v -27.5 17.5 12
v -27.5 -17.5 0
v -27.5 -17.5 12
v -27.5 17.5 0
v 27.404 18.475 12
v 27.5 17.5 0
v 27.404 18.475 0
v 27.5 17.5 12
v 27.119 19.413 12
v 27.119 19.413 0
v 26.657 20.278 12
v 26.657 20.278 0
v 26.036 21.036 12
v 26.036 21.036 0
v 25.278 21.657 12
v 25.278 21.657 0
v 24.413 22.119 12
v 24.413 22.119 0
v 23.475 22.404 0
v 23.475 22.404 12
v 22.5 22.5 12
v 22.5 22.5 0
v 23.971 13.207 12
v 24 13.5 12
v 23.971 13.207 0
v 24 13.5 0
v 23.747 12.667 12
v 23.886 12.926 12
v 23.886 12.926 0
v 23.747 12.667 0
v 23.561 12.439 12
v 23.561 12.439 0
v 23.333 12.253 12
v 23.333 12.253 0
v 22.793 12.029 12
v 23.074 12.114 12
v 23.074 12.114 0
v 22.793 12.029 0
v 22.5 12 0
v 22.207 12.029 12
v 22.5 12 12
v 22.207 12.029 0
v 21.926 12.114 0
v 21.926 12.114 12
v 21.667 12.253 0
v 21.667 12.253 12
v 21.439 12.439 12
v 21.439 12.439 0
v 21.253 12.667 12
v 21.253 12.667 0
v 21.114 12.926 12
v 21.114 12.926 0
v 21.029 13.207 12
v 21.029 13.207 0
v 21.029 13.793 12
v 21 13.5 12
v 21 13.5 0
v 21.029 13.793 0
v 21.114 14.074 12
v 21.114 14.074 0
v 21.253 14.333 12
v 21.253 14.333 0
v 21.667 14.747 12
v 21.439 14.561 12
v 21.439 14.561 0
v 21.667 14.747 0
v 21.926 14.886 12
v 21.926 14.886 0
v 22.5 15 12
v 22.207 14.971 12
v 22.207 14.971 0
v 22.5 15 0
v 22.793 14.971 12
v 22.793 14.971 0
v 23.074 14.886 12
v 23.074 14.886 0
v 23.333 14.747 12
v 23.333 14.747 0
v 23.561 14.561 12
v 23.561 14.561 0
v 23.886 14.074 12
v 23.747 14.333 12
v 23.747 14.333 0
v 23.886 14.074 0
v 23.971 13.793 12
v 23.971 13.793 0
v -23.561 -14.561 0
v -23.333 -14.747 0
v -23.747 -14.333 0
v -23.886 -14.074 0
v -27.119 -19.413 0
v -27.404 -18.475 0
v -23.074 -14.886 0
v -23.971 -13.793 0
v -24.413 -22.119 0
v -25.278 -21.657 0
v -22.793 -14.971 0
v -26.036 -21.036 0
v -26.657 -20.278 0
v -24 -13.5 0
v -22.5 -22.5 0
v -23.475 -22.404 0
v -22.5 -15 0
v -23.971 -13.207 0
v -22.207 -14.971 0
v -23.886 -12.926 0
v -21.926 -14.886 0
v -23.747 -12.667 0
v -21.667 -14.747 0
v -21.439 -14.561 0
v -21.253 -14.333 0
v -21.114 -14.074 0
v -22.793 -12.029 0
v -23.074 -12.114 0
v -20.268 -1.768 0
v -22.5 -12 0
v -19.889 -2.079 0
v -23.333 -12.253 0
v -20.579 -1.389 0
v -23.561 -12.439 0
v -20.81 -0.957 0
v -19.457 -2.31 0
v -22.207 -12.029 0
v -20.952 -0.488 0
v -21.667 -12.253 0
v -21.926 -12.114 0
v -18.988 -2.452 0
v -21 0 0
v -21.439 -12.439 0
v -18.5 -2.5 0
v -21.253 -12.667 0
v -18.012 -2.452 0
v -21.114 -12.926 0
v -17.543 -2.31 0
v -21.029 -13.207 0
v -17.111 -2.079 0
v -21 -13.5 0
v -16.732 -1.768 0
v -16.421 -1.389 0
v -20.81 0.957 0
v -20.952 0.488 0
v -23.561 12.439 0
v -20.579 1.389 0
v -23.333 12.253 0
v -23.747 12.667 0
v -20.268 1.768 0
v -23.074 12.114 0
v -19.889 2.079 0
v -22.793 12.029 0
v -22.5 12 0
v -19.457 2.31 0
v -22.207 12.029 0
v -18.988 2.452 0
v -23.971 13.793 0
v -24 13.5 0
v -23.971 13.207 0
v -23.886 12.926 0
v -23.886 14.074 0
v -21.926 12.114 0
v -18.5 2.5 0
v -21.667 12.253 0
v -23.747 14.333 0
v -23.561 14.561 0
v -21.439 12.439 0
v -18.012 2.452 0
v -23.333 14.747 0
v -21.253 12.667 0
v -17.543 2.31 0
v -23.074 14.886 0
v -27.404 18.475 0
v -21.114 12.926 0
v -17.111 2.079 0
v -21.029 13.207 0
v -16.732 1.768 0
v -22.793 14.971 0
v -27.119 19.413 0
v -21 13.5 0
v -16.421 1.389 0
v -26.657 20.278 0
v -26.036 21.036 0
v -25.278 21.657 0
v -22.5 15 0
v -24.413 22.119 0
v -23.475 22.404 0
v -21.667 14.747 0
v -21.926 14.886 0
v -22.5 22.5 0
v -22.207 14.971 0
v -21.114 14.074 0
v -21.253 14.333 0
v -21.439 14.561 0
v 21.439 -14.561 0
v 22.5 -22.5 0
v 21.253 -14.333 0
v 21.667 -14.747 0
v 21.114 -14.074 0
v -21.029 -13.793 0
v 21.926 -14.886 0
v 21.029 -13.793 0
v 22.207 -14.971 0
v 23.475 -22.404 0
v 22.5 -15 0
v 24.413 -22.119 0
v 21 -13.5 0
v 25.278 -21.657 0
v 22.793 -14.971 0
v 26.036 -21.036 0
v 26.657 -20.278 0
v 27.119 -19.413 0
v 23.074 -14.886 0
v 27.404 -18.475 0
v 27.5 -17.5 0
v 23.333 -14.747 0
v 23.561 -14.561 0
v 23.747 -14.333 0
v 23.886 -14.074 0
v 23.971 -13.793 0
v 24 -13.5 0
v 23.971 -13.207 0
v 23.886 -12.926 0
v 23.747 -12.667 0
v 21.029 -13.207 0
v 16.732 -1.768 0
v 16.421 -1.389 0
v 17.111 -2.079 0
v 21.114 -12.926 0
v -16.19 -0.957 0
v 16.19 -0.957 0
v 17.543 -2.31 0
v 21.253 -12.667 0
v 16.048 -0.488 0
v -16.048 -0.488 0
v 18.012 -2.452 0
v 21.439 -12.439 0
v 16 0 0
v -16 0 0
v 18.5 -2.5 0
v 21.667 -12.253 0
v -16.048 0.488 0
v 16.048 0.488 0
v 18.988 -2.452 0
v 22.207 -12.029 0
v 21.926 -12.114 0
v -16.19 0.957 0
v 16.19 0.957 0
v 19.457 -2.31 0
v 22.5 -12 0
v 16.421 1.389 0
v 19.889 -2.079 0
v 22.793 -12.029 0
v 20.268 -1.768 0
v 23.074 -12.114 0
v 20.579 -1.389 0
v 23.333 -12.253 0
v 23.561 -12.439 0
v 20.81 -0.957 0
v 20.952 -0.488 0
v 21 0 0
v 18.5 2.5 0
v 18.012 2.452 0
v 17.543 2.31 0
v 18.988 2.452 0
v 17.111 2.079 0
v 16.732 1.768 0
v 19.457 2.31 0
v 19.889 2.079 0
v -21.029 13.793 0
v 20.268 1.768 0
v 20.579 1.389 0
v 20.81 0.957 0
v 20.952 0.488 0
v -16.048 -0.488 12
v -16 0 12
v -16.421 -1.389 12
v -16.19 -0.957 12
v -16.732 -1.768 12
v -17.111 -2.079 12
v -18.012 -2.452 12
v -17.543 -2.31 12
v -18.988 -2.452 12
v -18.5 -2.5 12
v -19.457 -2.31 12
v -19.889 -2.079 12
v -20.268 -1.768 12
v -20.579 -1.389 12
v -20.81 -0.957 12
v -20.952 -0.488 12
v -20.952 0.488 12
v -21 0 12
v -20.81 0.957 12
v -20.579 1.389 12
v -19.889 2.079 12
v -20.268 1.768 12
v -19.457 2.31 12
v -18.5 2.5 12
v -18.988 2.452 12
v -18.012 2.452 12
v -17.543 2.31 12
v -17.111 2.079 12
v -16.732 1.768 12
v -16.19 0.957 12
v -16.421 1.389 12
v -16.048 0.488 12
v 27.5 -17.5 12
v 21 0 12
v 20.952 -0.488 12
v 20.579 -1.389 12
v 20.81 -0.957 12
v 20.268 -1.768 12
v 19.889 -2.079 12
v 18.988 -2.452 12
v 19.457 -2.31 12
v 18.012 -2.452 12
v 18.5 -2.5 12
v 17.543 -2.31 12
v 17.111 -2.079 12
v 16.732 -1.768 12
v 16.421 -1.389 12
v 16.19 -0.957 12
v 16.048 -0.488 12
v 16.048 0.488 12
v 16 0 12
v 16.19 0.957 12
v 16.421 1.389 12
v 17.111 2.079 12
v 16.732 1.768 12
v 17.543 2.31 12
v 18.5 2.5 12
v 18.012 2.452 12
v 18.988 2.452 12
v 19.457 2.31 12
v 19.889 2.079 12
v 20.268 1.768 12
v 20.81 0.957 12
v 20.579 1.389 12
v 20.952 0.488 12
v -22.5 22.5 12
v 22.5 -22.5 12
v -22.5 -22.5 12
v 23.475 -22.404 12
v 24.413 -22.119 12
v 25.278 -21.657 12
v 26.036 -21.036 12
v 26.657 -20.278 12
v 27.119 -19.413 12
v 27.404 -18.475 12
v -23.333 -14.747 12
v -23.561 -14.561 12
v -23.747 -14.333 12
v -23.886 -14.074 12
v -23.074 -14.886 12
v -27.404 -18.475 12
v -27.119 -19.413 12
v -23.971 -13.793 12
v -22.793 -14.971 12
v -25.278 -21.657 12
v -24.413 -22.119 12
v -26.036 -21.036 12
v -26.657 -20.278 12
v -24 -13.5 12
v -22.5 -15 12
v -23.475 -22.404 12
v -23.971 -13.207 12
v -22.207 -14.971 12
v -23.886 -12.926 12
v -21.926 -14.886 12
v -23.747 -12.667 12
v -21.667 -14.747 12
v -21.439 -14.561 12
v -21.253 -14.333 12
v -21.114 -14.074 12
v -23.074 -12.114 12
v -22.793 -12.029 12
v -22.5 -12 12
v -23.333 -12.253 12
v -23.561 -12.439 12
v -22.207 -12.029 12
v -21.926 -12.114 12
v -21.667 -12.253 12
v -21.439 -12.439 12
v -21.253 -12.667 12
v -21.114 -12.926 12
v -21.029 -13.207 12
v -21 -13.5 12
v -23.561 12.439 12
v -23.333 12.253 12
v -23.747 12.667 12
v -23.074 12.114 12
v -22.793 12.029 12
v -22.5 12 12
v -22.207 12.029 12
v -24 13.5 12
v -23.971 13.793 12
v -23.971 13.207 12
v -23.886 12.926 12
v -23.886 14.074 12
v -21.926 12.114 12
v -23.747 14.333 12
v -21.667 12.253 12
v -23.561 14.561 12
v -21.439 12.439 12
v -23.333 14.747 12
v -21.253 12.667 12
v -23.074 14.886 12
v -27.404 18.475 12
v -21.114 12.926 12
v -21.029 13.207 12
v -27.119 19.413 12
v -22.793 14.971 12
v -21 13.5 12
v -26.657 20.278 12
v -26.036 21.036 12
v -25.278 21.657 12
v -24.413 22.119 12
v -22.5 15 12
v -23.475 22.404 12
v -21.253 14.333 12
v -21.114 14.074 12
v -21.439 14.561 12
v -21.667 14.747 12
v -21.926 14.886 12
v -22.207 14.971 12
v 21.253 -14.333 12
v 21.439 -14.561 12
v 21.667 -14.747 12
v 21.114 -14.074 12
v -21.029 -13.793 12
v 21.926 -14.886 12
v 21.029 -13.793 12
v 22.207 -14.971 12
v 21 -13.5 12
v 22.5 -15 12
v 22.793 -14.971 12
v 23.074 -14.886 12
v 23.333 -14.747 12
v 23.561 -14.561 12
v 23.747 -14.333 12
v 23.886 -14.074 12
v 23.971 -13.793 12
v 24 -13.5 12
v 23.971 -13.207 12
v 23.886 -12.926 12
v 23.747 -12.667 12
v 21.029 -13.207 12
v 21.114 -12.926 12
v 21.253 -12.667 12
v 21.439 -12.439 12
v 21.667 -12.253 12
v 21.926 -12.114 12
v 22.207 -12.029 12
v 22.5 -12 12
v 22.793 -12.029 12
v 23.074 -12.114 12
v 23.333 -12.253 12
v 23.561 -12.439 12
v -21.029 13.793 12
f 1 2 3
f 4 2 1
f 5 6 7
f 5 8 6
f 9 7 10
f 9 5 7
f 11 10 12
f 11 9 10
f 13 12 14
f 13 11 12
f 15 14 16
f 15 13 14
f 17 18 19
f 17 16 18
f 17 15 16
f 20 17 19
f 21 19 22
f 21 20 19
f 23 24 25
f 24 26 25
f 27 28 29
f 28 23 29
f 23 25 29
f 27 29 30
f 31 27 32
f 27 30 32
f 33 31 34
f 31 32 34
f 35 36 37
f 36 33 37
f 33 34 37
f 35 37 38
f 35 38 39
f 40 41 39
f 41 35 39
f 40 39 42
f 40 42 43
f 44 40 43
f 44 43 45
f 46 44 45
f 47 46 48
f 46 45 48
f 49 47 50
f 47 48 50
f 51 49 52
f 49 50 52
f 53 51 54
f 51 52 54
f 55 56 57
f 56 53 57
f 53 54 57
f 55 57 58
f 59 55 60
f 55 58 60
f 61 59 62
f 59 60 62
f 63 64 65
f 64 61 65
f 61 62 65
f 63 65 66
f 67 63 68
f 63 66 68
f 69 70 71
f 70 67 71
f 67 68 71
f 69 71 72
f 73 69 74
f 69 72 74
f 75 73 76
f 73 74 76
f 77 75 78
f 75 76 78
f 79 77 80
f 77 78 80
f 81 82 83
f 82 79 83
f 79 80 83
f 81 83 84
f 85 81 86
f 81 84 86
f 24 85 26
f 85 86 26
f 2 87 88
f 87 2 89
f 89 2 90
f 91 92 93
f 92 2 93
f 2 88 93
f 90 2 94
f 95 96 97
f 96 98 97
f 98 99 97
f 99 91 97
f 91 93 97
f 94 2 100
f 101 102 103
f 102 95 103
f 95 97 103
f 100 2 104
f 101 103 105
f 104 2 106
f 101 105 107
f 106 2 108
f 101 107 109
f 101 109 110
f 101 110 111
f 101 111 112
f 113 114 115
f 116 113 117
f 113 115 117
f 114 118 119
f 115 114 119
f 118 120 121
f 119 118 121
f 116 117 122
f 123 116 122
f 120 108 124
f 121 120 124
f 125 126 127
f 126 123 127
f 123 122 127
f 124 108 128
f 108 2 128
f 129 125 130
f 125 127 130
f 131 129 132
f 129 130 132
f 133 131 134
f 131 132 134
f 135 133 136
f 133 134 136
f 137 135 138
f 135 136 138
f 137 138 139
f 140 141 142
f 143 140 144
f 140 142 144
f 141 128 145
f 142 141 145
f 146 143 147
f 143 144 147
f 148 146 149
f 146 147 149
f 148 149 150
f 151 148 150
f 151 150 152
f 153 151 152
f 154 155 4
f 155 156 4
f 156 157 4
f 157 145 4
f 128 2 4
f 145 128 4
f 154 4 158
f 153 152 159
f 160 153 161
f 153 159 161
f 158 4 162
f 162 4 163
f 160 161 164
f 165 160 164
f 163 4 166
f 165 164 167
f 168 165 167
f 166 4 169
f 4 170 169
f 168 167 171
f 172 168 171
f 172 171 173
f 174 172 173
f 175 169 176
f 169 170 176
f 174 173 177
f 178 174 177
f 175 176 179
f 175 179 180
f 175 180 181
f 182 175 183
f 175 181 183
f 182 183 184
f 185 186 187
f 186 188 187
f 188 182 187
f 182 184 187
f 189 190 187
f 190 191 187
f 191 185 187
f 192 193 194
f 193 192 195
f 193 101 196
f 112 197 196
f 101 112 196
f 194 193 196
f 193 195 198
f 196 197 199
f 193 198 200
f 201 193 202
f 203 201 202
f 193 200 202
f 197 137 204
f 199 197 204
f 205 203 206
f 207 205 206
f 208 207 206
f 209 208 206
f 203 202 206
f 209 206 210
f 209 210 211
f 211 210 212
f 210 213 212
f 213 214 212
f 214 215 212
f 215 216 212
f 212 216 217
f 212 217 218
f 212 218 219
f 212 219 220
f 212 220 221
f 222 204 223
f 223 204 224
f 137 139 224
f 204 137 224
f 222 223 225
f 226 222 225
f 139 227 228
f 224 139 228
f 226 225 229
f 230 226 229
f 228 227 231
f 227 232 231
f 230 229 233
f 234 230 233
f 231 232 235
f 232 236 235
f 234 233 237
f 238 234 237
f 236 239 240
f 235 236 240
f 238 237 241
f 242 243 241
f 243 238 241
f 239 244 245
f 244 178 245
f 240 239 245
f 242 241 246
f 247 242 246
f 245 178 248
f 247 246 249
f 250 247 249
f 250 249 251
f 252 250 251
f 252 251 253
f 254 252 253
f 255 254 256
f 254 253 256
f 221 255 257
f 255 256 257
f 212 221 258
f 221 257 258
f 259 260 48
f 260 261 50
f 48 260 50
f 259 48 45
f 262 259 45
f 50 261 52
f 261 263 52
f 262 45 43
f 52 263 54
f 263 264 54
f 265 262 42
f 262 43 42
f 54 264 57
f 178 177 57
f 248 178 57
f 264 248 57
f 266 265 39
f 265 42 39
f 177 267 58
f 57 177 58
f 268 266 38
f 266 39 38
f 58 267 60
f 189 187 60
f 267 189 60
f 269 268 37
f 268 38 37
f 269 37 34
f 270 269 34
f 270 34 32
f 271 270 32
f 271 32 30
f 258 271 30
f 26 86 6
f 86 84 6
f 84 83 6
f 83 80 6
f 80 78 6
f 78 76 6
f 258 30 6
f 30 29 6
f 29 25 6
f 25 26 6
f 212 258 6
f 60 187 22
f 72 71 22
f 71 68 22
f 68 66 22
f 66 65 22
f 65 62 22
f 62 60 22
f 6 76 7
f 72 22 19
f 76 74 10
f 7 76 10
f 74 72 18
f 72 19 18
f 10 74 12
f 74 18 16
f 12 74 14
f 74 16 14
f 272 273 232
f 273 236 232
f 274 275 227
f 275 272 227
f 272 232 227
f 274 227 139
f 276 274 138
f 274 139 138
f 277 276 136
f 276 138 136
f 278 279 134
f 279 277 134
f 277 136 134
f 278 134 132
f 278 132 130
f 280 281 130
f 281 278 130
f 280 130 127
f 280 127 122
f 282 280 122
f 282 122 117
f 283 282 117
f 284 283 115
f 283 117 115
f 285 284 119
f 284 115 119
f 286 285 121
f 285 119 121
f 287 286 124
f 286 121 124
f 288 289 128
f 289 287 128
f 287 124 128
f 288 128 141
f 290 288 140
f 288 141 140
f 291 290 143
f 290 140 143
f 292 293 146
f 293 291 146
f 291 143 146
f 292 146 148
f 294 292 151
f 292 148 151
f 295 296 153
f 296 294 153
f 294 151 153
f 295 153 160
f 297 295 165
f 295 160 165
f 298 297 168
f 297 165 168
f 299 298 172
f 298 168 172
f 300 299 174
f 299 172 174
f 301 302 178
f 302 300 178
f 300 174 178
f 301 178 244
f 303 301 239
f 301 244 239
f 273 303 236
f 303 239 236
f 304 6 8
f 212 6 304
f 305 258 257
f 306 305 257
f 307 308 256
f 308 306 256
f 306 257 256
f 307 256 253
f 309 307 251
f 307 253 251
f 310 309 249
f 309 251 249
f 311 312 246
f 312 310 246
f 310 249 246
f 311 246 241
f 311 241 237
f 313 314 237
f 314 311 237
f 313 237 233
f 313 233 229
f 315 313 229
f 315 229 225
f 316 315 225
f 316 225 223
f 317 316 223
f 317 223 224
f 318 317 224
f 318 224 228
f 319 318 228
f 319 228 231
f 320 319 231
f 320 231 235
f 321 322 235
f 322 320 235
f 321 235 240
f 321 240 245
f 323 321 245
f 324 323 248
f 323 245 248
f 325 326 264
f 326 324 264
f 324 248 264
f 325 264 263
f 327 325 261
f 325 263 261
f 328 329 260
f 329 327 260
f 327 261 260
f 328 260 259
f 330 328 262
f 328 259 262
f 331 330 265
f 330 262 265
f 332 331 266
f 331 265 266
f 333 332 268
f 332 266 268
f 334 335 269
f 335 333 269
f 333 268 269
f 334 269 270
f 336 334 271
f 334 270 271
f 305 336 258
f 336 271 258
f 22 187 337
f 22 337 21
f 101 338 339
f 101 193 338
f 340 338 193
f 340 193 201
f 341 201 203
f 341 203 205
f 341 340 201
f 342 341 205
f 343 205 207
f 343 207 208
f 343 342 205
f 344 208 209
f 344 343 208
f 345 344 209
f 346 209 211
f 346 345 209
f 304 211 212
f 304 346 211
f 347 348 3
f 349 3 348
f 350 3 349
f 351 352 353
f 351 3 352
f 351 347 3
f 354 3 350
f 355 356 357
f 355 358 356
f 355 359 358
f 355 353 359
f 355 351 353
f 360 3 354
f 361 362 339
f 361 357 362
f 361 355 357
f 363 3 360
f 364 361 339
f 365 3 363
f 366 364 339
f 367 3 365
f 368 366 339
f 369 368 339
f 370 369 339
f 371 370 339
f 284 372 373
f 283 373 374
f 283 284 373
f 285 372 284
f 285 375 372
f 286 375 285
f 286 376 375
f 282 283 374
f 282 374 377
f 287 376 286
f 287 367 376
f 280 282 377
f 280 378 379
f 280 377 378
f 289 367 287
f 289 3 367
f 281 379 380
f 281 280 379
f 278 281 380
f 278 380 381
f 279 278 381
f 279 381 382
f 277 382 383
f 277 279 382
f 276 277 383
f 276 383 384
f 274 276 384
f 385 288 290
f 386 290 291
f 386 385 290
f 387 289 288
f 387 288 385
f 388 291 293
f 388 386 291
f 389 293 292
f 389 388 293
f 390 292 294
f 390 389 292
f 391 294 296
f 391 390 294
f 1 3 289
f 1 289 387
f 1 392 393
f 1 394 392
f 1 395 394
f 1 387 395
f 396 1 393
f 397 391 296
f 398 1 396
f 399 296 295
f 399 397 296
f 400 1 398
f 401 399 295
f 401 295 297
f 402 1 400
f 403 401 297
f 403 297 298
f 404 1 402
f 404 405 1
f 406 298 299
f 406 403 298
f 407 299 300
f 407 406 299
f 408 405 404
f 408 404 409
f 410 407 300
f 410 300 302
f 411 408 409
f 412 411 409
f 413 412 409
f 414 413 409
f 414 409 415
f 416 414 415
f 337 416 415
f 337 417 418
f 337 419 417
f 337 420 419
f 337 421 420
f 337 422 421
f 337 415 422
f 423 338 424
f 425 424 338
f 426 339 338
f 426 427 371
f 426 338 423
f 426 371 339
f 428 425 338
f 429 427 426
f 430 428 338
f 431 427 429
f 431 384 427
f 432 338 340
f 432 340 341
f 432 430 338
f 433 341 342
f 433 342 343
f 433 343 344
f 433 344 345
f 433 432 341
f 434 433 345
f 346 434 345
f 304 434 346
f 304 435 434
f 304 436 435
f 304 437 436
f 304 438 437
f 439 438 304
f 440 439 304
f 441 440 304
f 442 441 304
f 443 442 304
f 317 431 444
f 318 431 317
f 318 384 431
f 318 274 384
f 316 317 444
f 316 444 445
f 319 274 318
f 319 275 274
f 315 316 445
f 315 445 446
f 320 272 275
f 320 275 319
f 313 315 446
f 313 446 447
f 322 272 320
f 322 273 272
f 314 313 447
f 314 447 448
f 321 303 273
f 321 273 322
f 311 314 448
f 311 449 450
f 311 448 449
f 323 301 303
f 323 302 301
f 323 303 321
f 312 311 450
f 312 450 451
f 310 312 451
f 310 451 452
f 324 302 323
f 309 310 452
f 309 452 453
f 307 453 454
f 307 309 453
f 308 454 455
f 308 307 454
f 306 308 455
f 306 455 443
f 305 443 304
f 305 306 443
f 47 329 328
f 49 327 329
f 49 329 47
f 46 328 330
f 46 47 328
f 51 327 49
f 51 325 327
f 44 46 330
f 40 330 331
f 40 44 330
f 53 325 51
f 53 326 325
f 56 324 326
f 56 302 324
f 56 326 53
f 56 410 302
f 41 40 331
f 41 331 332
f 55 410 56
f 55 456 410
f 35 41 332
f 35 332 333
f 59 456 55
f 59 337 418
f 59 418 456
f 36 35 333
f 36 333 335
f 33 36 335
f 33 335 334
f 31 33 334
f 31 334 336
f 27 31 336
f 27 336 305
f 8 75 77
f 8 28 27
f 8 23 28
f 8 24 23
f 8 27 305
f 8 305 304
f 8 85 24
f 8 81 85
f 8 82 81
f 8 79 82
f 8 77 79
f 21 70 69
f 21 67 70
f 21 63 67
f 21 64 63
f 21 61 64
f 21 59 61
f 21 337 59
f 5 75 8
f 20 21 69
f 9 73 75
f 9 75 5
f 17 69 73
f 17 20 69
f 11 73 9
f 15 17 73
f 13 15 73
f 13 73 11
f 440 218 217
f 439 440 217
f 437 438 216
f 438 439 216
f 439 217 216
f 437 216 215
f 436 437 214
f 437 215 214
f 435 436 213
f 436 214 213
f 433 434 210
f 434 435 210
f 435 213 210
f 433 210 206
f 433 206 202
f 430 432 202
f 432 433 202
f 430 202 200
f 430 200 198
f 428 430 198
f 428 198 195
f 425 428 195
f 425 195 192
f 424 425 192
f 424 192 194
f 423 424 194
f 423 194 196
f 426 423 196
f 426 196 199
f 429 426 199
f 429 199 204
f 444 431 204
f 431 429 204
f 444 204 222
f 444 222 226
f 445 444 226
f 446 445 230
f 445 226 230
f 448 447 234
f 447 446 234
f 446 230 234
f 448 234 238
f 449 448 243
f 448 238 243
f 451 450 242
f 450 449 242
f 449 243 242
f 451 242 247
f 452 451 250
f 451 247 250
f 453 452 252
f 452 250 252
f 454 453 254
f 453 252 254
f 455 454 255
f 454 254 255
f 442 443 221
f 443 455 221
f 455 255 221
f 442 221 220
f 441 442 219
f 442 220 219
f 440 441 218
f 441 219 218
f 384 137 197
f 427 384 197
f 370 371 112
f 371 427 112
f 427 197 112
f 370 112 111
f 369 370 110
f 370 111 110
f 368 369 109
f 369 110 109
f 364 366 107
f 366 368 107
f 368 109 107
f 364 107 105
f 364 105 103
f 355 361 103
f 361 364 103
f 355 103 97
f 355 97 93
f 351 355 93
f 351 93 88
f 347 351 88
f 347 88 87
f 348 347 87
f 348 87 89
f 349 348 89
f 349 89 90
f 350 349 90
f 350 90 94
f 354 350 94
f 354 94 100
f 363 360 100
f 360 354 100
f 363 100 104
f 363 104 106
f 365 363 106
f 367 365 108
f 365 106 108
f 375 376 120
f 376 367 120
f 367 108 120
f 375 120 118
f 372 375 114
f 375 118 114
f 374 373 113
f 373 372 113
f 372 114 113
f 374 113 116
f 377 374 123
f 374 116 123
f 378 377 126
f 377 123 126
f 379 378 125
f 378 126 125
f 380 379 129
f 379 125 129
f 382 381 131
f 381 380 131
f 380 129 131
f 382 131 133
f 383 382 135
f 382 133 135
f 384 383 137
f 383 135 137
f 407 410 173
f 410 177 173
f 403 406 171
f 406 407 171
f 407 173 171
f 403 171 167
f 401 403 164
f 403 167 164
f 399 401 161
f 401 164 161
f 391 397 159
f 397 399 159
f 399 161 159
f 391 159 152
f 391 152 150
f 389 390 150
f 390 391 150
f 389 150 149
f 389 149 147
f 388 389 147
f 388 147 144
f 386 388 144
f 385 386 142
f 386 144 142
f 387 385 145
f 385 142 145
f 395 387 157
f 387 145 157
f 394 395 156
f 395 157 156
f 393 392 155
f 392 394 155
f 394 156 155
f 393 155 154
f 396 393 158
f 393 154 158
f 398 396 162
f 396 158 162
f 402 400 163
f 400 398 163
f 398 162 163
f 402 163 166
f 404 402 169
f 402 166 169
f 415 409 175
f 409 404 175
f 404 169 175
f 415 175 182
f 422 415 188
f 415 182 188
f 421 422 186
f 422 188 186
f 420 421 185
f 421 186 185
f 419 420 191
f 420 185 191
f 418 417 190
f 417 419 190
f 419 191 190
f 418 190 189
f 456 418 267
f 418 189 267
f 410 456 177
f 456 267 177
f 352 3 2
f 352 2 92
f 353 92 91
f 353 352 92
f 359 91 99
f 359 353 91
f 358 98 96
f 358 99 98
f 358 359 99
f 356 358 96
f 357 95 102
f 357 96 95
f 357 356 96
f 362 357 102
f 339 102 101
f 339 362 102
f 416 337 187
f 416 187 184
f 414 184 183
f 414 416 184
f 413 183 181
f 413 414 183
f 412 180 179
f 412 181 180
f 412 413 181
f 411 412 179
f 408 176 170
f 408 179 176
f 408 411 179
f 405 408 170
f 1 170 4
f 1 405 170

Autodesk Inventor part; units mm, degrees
ref_plane "YZ Plane" through (0, 0, 0) normal (1, 0, 0) x (0, 1, 0)
ref_plane "XZ Plane" through (0, 0, 0) normal (0, 1, 0) x (-1, 0, 0)
ref_plane "XY Plane" through (0, 0, 0) normal (0, 0, 1) x (1, 0, 0)
sketch "Boceto1" plane through (0, 0, 0) normal (0, 0, 1) x (1, 0, 0)
  circle A0 centre (-22.5, 13.5) radius 1.5
  circle A1 centre (22.5, 13.5) radius 1.5
  line L0 (-22.5, 13.5) -> (22.5, 13.5) construction
  line L1 (-22.5, 13.5) -> (22.5, 13.5) construction
  line L2 (0, 13.5) -> (0, 0) construction
  line L3 (27.5, -22.5) -> (-27.5, -22.5)
  line L4 (-27.5, -22.5) -> (-27.5, 22.5)
  line L5 (-27.5, 22.5) -> (27.5, 22.5)
  line L6 (27.5, 22.5) -> (27.5, -22.5)
  line L7 (27.5, -22.5) -> (-27.5, 22.5) construction
  line L8 (-27.5, -22.5) -> (27.5, 22.5) construction
  line L9 (-27.5, 0) -> (27.5, 0) construction
  circle A2 centre (-22.5, -13.5) radius 1.5
  circle A3 centre (22.5, -13.5) radius 1.5
  circle A4 centre (18.5, 0) radius 2.5
  circle A5 centre (-18.5, 0) radius 2.5
  dimension "d2" = 3
  dimension "d3" = 3
  dimension "d10" = 45
  dimension "d11" = 55
  dimension "d12" = 45
  dimension "d15" = 13.5
  dimension "d17" = 18.5
  dimension "d18" = 5
extrude "Extrusión1" add sketch "Boceto1" along normal blind 12
fillet "Empalme1" radius 5 4 edges at (27.5, 22.5, 6) (27.5, -22.5, 6) (-27.5, -22.5, 6) (-27.5, 22.5, 6)
properties part number "ImpresionSoporte" material "Plástico ABS"
